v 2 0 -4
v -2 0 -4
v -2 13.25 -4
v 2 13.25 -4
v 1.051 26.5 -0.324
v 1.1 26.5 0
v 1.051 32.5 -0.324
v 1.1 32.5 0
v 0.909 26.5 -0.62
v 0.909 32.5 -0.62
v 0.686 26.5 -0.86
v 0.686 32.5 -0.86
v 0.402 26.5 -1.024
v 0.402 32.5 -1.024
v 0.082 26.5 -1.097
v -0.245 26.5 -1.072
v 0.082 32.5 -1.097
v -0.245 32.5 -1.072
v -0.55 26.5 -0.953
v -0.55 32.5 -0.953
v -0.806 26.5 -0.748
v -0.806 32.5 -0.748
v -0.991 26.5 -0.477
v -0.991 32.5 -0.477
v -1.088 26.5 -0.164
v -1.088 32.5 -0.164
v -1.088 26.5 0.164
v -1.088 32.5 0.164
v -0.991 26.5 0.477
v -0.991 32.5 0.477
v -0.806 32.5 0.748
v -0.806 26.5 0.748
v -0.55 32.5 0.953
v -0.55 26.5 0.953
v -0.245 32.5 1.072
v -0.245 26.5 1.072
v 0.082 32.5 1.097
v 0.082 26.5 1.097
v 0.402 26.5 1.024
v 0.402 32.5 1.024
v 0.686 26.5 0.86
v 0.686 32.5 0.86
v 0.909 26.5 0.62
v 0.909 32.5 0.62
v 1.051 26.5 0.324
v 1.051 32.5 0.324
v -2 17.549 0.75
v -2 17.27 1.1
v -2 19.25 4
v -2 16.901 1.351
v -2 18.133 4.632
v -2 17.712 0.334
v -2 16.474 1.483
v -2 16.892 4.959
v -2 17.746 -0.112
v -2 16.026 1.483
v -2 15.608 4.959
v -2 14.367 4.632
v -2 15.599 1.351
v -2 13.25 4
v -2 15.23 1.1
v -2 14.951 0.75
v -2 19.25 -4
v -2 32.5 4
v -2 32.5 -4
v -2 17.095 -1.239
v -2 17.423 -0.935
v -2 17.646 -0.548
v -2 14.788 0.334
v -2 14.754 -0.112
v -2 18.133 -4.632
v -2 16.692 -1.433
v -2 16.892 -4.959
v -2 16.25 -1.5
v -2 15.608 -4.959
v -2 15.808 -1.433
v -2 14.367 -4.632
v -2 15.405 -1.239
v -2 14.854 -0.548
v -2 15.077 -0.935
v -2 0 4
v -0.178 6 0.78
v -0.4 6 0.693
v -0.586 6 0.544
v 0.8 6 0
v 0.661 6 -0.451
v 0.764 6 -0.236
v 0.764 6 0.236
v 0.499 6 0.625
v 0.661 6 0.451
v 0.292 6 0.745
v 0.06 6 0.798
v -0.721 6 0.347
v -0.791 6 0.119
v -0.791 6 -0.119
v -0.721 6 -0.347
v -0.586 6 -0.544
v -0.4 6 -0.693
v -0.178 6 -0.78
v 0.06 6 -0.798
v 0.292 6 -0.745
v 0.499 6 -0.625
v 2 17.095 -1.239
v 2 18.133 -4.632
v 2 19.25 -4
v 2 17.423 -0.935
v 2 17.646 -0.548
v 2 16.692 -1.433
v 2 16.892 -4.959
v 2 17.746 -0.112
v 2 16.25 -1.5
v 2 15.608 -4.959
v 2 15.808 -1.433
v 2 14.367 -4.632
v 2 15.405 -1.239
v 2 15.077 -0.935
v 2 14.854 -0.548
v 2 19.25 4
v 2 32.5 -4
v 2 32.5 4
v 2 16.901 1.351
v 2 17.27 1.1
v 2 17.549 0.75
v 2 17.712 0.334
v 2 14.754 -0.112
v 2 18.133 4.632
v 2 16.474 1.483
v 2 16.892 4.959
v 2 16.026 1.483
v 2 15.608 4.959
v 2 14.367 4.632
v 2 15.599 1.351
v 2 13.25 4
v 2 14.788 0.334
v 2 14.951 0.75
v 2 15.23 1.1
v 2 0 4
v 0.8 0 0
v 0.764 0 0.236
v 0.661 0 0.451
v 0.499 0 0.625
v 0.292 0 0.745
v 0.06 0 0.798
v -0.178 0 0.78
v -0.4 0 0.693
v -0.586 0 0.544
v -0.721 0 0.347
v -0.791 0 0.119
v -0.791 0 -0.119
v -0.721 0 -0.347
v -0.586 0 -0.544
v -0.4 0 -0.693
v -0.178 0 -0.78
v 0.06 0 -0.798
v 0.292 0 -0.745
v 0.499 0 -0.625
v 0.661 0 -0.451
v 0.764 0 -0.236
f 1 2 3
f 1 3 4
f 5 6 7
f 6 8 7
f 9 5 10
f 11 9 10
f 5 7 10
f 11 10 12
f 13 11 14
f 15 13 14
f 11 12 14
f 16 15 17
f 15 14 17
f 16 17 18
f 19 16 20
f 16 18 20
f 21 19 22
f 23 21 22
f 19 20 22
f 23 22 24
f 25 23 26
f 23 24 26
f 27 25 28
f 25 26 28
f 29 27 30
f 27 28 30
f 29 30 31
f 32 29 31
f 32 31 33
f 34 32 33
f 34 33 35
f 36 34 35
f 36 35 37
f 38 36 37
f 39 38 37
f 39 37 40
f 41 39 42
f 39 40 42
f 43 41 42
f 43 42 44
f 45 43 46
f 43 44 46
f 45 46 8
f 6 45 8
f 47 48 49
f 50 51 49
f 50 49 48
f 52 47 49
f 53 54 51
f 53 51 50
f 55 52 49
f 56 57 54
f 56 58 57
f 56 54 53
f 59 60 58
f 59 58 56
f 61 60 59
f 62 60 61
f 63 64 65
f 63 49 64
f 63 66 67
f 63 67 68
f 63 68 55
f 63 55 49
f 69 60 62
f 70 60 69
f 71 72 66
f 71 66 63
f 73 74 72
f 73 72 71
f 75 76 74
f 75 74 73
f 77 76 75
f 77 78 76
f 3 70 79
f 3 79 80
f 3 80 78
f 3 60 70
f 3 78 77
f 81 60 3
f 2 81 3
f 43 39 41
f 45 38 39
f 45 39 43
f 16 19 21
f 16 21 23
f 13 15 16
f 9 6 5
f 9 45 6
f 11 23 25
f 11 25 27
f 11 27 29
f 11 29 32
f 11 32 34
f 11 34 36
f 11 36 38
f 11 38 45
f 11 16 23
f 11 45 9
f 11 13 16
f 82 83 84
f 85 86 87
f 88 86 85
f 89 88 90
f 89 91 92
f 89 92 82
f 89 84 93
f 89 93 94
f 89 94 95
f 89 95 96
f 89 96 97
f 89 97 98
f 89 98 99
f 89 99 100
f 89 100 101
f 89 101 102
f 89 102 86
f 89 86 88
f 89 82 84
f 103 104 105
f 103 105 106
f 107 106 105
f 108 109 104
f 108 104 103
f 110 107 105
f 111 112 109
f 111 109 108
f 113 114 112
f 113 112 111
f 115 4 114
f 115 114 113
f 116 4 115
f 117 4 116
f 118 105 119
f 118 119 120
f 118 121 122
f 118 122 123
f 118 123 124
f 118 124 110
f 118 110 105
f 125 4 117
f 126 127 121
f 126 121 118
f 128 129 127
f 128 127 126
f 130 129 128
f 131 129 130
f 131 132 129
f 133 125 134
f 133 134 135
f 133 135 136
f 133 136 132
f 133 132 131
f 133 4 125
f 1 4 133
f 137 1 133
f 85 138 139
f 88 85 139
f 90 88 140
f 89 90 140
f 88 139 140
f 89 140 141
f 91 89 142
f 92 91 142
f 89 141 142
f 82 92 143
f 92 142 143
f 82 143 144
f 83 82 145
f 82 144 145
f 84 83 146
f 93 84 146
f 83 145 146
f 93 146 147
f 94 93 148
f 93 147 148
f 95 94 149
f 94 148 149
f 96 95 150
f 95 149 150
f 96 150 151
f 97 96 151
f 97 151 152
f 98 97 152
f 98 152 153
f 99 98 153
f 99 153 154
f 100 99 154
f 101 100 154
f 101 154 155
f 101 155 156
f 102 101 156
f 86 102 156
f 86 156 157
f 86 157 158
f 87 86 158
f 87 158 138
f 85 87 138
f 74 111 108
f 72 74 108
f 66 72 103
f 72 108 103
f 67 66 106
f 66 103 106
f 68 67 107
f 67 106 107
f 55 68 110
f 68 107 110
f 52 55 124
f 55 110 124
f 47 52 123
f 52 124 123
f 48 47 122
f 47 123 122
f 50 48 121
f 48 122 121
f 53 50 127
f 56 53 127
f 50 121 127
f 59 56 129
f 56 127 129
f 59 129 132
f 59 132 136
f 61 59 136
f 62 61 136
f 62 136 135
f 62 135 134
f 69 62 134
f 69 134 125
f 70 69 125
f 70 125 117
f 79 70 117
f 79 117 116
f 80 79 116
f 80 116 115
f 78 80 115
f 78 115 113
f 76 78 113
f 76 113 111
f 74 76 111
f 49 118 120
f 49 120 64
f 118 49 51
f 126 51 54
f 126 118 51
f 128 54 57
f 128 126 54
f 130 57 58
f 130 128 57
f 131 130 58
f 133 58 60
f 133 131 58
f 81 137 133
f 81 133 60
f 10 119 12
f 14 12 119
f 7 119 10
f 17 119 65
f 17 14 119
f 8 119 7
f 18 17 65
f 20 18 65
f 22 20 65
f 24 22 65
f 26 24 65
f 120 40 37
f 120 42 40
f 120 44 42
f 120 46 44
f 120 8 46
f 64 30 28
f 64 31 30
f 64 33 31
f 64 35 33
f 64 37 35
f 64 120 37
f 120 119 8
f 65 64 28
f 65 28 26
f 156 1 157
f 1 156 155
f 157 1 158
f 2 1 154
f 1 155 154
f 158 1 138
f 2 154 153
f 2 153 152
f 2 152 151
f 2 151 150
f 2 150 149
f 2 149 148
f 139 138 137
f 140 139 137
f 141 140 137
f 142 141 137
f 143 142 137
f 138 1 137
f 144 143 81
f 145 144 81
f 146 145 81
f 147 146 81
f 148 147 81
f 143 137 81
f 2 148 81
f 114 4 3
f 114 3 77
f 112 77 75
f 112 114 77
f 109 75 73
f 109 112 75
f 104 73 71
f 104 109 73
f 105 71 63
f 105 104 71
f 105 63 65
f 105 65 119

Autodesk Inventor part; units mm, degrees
ref_plane "YZ Plane" through (0, 0, 0) normal (1, 0, 0) x (0, 1, 0)
ref_plane "XZ Plane" through (0, 0, 0) normal (0, 1, 0) x (-1, 0, 0)
ref_plane "XY Plane" through (0, 0, 0) normal (0, 0, 1) x (1, 0, 0)
sketch "スケッチ1" plane through (0, 0, 0) normal (0, 1, 0) x (-1, 0, 0)
  line L0 (-2, 4) -> (2, 4)
  line L1 (2, 4) -> (2, -4)
  line L2 (2, -4) -> (-2, -4)
  line L3 (-2, -4) -> (-2, 4)
  line L4 (-2, 4) -> (2, -4) construction
  line L5 (2, 4) -> (-2, -4) construction
  circle A0 centre (0, 0) radius 1
  dimension "d0" = 8
  dimension "d1" = 4
  dimension "d2" = 2
extrude "押し出し1" add sketch "スケッチ1" along normal blind 32.5 contours L0 L1 L2 L3 | A0
sketch "スケッチ2" plane through (0, 0, 0) normal (0, -1, 0) x (1, 0, 0)
  circle A0 centre (0, 0) radius 0.8
  dimension "d5" = 1.6
extrude "押し出し2" cut sketch "スケッチ2" against normal blind 6
sketch "スケッチ3" plane through (2, 0, 4) normal (1, 0, 0) x (0, 0, -1)
  circle A0 centre (4, 24.25) radius 1.5 construction
  circle A1 centre (4, 8.25) radius 1.5 construction
  line L0 (8, 32.5) -> (0, 32.5) projected
  line L1 (4, 32.5) -> (4, 0)
  line L2 (4, 0) -> (3.3318, 0)
  line L3 (4, 32.5) -> (4, 24.25) construction
  line L4 (4, 24.25) -> (4, 8.25) construction
  line L5 (4, 8.25) -> (4, 0) construction
  line L6 (0, 0) -> (8, 0) projected
  line L7 (0, 32.5) -> (8, 32.5) projected
  circle A2 centre (4, 16.25) radius 1.5
  dimension "d8" = 3
  dimension "d9" = 16
  dimension "d15" = 3
extrude "押し出し3" cut sketch "スケッチ3" against normal up to surface (4 mm away)
sketch "スケッチ4" plane through (0, 32.5, 0) normal (0, 1, 0) x (1, 0, 0)
  circle A0 centre (0, 0) radius 1.1
  dimension "d12" = 2.2
extrude "押し出し4" cut sketch "スケッチ4" against normal blind 6
sketch "スケッチ5" plane through (2, 0, 4) normal (1, 0, 0) x (0, 0, -1)
  circle A0 centre (4, 16.25) radius 1.5 projected
  line L0 (0, 0) -> (8, 0) projected
  line L1 (8, 0) -> (8, 32.5) projected
  line L2 (0, 32.5) -> (8, 32.5) projected
  line L3 (0, 0) -> (0, 32.5) projected
  circle A1 centre (4, 16.25) radius 5
  point P0 (4, 0)
  dimension "d16" = 10
extrude "押し出し5" add sketch "スケッチ5" against normal up to surface (4 mm away) contours A1 L3 | L3 A1 L1 | L1 A1
properties part number "BallSensor"
